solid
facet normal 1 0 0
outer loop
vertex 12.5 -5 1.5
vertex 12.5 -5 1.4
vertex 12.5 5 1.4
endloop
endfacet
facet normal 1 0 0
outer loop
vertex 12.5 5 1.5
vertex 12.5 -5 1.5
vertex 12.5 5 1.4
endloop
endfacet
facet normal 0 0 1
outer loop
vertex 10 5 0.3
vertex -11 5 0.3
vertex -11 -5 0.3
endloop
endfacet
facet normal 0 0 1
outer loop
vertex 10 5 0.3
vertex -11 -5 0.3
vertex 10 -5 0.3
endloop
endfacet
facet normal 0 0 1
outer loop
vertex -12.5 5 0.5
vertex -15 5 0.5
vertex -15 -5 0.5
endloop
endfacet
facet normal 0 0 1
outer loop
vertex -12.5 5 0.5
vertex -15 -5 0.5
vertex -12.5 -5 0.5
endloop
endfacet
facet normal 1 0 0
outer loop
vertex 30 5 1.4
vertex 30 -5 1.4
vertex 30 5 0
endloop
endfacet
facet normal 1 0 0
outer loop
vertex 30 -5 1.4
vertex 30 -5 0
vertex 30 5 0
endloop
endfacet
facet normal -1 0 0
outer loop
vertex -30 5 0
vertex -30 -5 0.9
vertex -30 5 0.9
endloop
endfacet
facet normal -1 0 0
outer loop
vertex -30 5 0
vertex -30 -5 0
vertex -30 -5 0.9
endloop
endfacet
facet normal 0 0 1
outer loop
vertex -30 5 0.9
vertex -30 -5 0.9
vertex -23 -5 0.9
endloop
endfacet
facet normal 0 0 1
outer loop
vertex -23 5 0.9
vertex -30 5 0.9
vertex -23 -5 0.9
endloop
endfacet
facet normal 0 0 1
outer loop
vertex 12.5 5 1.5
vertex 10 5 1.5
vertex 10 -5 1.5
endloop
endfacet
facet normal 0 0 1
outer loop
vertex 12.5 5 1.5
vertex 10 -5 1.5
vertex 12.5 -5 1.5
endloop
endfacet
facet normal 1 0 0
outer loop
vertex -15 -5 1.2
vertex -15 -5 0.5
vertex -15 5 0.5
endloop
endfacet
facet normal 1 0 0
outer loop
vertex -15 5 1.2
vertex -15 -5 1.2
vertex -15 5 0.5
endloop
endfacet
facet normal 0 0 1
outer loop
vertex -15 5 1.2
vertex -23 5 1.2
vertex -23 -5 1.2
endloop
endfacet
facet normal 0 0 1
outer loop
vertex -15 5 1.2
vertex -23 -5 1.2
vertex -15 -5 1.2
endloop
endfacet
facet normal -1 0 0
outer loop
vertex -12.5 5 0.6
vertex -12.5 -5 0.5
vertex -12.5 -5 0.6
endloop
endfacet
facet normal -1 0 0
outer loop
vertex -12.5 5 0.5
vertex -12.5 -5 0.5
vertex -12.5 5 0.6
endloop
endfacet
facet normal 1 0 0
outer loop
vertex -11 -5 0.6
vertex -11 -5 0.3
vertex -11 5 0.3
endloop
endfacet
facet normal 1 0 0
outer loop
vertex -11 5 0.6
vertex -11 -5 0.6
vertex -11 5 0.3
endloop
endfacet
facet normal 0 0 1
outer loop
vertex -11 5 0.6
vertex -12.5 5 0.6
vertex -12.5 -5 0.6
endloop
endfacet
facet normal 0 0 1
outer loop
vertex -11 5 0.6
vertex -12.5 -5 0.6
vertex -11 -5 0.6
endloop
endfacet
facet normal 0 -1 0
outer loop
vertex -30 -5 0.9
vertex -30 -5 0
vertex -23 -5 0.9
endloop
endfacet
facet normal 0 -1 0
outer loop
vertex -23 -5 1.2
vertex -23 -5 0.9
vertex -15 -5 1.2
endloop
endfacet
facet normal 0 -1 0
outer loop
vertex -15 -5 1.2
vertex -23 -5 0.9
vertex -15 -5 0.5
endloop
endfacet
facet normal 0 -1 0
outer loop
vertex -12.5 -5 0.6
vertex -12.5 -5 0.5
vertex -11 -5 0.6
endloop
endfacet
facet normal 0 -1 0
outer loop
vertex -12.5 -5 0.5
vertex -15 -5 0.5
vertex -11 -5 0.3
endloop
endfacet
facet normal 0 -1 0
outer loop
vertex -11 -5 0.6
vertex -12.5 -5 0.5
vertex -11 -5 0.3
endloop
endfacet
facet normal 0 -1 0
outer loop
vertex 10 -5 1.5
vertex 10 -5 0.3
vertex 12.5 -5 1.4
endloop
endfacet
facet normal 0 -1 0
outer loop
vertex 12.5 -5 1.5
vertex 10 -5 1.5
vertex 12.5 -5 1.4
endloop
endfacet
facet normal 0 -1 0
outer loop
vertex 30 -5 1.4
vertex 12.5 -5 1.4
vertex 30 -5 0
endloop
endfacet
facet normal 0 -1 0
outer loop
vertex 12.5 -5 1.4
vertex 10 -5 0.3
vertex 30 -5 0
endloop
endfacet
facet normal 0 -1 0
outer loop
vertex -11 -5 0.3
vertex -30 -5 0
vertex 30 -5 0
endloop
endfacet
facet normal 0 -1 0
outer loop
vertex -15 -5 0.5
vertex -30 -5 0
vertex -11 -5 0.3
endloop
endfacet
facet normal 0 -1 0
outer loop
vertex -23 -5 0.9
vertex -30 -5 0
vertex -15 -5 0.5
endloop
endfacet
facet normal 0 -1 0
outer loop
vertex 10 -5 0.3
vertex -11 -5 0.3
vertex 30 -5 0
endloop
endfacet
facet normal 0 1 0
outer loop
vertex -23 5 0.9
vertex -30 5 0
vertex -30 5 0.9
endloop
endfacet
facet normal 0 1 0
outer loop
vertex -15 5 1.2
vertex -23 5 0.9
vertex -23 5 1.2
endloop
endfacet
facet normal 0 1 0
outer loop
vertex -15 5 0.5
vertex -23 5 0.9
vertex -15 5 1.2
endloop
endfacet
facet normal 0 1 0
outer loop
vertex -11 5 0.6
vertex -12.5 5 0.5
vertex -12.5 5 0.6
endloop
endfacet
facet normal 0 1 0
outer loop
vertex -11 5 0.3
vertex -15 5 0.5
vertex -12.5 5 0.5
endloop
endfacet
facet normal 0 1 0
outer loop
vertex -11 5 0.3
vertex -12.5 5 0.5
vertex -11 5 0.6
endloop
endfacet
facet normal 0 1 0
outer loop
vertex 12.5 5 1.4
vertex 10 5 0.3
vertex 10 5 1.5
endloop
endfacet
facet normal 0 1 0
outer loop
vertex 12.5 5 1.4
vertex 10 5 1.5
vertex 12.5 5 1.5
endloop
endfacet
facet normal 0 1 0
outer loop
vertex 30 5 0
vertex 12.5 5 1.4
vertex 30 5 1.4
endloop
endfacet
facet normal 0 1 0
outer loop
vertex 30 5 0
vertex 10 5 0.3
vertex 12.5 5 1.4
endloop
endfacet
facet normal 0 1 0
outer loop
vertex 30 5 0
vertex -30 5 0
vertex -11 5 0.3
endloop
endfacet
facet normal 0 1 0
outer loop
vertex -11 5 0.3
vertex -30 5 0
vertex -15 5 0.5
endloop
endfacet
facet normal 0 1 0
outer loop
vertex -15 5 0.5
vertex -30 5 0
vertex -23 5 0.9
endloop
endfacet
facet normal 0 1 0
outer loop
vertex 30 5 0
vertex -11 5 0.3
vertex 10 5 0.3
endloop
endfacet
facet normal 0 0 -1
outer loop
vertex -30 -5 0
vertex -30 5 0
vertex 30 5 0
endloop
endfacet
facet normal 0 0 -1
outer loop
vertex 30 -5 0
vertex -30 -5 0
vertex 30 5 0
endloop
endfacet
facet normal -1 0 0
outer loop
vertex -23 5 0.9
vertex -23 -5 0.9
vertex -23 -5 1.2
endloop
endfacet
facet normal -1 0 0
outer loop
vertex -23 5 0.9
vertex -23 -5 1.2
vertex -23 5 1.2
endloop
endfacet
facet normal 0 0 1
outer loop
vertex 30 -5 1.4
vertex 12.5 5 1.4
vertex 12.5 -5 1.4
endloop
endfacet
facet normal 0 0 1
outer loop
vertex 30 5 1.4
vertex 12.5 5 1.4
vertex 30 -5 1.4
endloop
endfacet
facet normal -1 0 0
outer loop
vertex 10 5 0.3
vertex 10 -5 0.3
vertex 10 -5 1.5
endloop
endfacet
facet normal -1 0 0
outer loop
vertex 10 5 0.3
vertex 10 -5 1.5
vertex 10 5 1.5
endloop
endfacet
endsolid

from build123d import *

# Parameters (mm, degrees)
F0_W      = 60
F0_H      = 10
F1_DEPTH  = 0.2
F2_W      = 25
F2_H      = 10
F3_DEPTH  = 0.1
F4_W      = 1.5
F4_H      = 10
F5_DEPTH  = 0.3
F6_W      = 10.5
F6_H      = 10
F7_DEPTH  = 0.3
F8_W      = 7
F8_H      = 10
F9_DEPTH  = 0.7
F10_W     = 8
F10_H     = 10
F11_DEPTH = 0.7
F12_W     = 17.5
F12_H     = 10
F13_DEPTH = 1.2
F14_W     = 2.5
F14_H     = 10
F15_DEPTH = 1.2


with BuildPart() as f1:
    # F0 (on Top) → F1 (new body)
    with BuildSketch(Plane.XY):
        Rectangle(F0_W, F0_H)
    extrude(amount=F1_DEPTH)

    # F2 (on face) → F3 (join)
    with BuildSketch(Plane.XY.offset(0.2)):
        Rectangle(F2_W, F2_H)
    extrude(amount=F3_DEPTH)

    # F4 (on face) → F5 (join)
    with BuildSketch(Plane.XY.offset(0.3)):
        with Locations((-11.75, 0)):
            Rectangle(F4_W, F4_H)
    extrude(amount=F5_DEPTH)

    # F6 (on face) → F7 (join)
    with BuildSketch(Plane.XY.offset(0.2)):
        with Locations((-17.75, 0)):
            Rectangle(F6_W, F6_H)
    extrude(amount=F7_DEPTH)

    # F8 (on face) → F9 (join)
    with BuildSketch(Plane.XY.offset(0.2)):
        with Locations((-26.5, 0)):
            Rectangle(F8_W, F8_H)
    extrude(amount=F9_DEPTH)

    # F10 (on face) → F11 (join)
    with BuildSketch(Plane.XY.offset(0.5)):
        with Locations((-19, 0)):
            Rectangle(F10_W, F10_H)
    extrude(amount=F11_DEPTH)

    # F12 (on face) → F13 (join)
    with BuildSketch(Plane.XY.offset(0.2)):
        with Locations((21.25, 0)):
            Rectangle(F12_W, F12_H)
    extrude(amount=F13_DEPTH)

    # F14 (on face) → F15 (join)
    with BuildSketch(Plane.XY.offset(0.3)):
        with Locations((11.25, 0)):
            Rectangle(F14_W, F14_H)
    extrude(amount=F15_DEPTH)


solid = f1.part
